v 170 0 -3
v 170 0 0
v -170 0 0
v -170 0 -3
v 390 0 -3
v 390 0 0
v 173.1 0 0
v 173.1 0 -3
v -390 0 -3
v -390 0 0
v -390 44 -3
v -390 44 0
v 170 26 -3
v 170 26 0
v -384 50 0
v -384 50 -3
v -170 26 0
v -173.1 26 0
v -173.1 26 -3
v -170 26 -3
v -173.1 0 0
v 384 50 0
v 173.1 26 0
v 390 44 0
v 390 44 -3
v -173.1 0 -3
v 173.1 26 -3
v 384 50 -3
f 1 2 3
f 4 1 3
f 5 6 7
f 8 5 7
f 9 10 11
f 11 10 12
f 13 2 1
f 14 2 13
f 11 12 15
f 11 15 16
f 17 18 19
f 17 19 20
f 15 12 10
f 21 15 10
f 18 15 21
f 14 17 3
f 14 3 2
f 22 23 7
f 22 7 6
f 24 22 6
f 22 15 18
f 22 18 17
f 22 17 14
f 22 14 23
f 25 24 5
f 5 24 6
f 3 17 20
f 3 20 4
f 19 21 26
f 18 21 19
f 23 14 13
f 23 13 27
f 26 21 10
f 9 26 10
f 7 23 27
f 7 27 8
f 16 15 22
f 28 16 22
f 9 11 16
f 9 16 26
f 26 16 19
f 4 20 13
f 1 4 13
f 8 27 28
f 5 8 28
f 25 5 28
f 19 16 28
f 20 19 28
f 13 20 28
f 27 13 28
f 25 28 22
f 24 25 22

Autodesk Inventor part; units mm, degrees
ref_plane "YZ Plane" through (0, 0, 0) normal (1, 0, 0) x (0, 1, 0)
ref_plane "XZ Plane" through (0, 0, 0) normal (0, 1, 0) x (-1, 0, 0)
ref_plane "XY Plane" through (0, 0, 0) normal (0, 0, 1) x (1, 0, 0)
sketch "Sketch1" plane through (0, 0, 0) normal (0, 0, 1) x (1, 0, 0)
  line L0 (-390, 50) -> (390, 50)
  line L1 (390, 50) -> (390, 0)
  line L2 (390, 0) -> (-390, 0)
  line L3 (-390, 0) -> (-390, 50)
  circle A0 centre (-390, 0) radius 25
  circle A1 centre (390, 0) radius 25
  point P0 (0, 0)
  point P1 (0, 0)
  point P2 (-390, 25)
  point P3 (-365, 0)
  point P4 (365, 0)
  point P5 (390, 25)
  dimension "d16" = 50
  dimension "d17" = 780
  dimension "d18" = 50
  dimension "d19" = 50
extrude "Plate2" add sketch "Sketch1" against normal blind 3 contours L0 L1 A1 L2 A0 L3 | A0 L2 L3 | L1 L2 A1 picked at (-378.289, 11.711) picked at (388.1457, 16.4577)
sketch "Sketch2" plane through (0, 0, 0) normal (0, 0, 1) x (1, 0, 0)
  line L0 (390, 50) -> (-390, 50) projected
  line L1 (171.55, 50) -> (171.55, 0) construction
  line L2 (-390, 0) -> (390, 0) projected
  line L3 (170, 26) -> (173.1, 26)
  line L4 (173.1, 26) -> (173.1, 0)
  line L5 (173.1, 0) -> (170, 0)
  line L6 (170, 0) -> (170, 26)
  line L7 (-171.55, 0) -> (-171.55, 50) construction
  line L8 (-173.1, 26) -> (-170, 26)
  line L9 (-170, 26) -> (-170, 0)
  line L10 (-170, 0) -> (-173.1, 0)
  line L11 (-173.1, 0) -> (-173.1, 26)
  line L12 (0, 0) -> (0, 50)
  point P0 (0, 0)
  point P1 (170, 0)
  point P2 (173.1, 0)
  point P3 (-173.1, 0)
  point P4 (-170, 0)
  dimension "d27" = 26
  dimension "d28" = 3.1
  dimension "d34" = 340
extrude "Extrusion1" cut sketch "Sketch2" against normal blind 10
sketch "Sketch4" plane through (0, 0, -3) normal (0, 0, -1) x (-1, 0, 0)
  line L0 (-62.455, 14.7345) -> (-62.455, 33.3208) construction
  line L1 (-62.455, 33.3208) -> (72.8584, 33.3208) construction
  line L2 (72.8584, 33.3208) -> (72.8584, 14.7345) construction
  line L3 (72.8584, 14.7345) -> (-62.455, 14.7345) construction
  point P0 (0, 0)
mark "Mark1"
chamfer "Corner Chamfer1" distance 6 angle 45 2 edges at (390, 50, -1.5) (-390, 50, -1.5)
equation "\"d27\" = d23"
equation "\"d20\" = Thickness"
equation "\"BendReliefWidth\" = Thickness"
equation "\"BendReliefDepth\" = 0.5 * Thickness"
equation "\"CornerReliefSize\" = 4 * Thickness"
equation "\"MinimumRemnant\" = 2 * Thickness"
equation "\"TransitionRadius\" = BendRadius"
equation "\"JacobiRadiusSize\" = BendRadius"
equation "\"GapSize\" = Thickness"
equation "\"d23\" = 26"
equation "\"Thickness\" = 3"
equation "\"BendRadius\" = 5"
properties part number "MSC 109 RIB CONE" material "Stainless Steel"
